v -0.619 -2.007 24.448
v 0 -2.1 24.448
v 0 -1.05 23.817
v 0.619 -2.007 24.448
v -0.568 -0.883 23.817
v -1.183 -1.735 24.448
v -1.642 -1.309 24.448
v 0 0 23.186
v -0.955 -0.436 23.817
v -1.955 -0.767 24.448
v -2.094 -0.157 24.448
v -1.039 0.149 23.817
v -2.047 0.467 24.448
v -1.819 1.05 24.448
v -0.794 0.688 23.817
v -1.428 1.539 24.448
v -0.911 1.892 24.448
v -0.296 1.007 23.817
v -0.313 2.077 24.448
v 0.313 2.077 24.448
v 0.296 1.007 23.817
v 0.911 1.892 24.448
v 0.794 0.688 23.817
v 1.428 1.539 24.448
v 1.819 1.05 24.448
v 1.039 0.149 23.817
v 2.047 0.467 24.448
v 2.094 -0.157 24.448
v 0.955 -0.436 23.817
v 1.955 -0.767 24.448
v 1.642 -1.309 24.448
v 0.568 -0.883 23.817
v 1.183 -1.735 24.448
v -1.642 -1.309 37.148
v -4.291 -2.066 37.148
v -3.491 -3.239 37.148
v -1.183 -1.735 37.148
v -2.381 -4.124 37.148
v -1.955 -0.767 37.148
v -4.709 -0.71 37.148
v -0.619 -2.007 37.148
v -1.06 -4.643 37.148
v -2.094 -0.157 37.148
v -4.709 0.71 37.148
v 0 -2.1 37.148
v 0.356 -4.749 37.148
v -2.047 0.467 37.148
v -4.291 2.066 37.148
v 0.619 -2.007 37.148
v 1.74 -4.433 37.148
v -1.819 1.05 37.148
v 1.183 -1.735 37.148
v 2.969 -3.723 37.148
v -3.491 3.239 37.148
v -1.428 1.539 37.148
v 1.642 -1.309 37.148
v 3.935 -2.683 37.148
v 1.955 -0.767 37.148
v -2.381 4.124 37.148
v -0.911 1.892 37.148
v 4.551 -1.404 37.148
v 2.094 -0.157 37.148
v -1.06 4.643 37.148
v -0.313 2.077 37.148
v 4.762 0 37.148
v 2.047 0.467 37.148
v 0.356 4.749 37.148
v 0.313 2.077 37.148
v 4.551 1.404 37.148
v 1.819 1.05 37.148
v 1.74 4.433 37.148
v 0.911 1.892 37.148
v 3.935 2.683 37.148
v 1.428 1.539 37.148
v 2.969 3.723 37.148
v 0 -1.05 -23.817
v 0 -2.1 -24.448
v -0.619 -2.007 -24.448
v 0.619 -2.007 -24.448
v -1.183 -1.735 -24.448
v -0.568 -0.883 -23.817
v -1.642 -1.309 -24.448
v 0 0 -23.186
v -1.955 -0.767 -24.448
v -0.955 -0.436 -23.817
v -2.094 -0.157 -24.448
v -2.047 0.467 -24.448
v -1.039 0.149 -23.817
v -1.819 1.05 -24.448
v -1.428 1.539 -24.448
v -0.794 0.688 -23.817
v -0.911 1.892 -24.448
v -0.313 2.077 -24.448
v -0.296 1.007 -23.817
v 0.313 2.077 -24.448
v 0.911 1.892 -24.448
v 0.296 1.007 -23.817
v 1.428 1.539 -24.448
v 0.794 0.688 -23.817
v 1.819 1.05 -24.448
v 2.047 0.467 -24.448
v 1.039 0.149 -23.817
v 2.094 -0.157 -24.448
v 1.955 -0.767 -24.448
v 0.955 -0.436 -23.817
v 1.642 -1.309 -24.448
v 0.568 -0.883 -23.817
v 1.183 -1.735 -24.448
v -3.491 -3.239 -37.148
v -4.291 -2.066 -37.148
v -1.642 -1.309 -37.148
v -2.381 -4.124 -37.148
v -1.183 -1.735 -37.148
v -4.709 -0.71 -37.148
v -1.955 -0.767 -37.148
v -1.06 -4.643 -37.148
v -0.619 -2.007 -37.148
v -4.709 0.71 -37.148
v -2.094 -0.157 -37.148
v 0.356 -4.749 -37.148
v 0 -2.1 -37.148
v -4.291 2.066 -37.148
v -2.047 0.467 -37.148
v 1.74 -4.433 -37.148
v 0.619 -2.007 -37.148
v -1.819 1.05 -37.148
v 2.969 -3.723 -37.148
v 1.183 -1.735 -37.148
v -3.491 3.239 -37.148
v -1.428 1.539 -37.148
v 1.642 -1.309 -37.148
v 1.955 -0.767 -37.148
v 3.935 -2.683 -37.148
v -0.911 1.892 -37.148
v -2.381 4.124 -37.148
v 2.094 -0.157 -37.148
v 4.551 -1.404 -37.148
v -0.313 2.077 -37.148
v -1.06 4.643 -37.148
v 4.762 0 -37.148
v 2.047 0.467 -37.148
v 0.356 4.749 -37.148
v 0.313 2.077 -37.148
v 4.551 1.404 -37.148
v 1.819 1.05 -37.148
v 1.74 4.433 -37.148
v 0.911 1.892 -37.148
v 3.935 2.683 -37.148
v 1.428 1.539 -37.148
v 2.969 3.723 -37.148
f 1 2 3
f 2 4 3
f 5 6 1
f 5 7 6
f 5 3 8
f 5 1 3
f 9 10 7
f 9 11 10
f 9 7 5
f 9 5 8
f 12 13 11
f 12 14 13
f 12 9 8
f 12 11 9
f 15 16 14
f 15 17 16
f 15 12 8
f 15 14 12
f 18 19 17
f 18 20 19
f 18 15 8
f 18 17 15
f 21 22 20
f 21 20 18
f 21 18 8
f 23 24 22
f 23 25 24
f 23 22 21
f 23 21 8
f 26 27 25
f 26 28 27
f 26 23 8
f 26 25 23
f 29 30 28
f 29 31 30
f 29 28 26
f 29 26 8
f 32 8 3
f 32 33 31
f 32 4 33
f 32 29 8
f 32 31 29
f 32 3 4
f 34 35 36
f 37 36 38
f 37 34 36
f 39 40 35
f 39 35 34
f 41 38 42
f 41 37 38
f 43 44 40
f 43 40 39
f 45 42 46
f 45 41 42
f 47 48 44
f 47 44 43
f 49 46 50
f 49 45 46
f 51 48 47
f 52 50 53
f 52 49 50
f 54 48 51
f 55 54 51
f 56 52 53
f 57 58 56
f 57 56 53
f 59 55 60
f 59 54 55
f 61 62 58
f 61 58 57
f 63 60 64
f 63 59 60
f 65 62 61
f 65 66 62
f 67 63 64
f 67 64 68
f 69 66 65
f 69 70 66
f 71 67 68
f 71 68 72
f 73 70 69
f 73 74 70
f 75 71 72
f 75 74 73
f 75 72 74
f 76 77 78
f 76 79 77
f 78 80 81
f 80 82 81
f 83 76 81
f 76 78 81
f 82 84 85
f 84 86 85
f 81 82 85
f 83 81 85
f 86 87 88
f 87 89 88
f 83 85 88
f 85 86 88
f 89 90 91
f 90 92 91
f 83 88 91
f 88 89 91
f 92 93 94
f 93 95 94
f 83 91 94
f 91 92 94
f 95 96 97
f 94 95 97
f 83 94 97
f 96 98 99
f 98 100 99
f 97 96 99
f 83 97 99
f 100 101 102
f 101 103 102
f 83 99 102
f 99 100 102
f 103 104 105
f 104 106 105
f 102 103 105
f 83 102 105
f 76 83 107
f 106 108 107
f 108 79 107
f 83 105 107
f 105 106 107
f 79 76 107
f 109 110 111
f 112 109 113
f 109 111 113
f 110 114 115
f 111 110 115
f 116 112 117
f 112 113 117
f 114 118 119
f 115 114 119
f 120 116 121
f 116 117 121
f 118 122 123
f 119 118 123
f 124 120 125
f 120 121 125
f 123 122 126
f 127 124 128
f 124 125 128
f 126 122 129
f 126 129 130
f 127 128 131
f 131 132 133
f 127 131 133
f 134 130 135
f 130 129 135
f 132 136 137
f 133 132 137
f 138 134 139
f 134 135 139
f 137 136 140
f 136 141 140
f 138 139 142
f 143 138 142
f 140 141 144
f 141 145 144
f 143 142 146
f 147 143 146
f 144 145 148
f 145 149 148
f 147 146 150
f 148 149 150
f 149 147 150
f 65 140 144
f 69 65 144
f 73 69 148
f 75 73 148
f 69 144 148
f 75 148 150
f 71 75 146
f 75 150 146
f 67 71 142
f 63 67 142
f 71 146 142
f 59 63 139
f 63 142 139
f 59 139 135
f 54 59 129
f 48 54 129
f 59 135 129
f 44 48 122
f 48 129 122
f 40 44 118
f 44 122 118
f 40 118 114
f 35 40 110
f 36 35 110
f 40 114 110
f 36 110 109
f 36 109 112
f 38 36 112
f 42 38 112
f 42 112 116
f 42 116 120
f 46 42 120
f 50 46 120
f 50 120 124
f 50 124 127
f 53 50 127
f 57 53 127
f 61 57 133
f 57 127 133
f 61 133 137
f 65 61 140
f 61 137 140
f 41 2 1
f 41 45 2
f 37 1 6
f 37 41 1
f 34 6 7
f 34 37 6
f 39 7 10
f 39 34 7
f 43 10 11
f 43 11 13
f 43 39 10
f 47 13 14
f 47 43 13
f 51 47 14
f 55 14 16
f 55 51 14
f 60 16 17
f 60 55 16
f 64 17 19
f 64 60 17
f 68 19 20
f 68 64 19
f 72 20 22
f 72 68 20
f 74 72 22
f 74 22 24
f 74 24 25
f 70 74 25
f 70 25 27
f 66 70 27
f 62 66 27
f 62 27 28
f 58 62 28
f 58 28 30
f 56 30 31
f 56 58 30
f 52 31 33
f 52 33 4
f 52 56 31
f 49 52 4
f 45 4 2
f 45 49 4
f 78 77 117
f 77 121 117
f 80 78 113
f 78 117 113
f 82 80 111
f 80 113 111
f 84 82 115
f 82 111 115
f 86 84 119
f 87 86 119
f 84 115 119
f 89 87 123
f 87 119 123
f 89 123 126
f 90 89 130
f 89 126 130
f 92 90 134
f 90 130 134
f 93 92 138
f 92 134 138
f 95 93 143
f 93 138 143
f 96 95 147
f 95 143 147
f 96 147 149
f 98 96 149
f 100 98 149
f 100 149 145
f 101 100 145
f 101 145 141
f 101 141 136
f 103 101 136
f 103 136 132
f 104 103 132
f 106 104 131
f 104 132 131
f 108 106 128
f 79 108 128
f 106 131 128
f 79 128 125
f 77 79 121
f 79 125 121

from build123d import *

# Parameters (mm, degrees)
BOSS_EXTRUDE1_DEPTH      = 37.1475
BOSS_EXTRUDE1_DEPTH_BACK = 37.1475
SKETCH3_R                = 4.7625


with BuildPart() as part:
    # Sketch3 → Boss-Extrude1 (new, two sides: drawn at the far end of the back side and taken through both)
    with BuildSketch(Plane.XY.offset(-BOSS_EXTRUDE1_DEPTH_BACK)):
        Circle(SKETCH3_R)
    extrude(amount=BOSS_EXTRUDE1_DEPTH + BOSS_EXTRUDE1_DEPTH_BACK)

    # Sketch6 → Tap Drill for M5x0.8 Tap1 (revolve, cut)
    with BuildSketch(Plane(origin=(0, 0, 37.1475), x_dir=(0, -1, 0), z_dir=(1, 0, 0))):
        Polygon((0, 0), (0, 13.9618073), (2.1, 12.7), (2.1, 0), align=None)
    tap_drill_for_m5x0_8_tap1 = revolve(axis=Axis((0, 0, 43.4975), (0, 0, -1)), mode=Mode.SUBTRACT)

    # Mirror1: Tap Drill for M5x0.8 Tap1 across plane
    add(tap_drill_for_m5x0_8_tap1.mirror(Plane.XY), mode=Mode.SUBTRACT)


solid = part.part
